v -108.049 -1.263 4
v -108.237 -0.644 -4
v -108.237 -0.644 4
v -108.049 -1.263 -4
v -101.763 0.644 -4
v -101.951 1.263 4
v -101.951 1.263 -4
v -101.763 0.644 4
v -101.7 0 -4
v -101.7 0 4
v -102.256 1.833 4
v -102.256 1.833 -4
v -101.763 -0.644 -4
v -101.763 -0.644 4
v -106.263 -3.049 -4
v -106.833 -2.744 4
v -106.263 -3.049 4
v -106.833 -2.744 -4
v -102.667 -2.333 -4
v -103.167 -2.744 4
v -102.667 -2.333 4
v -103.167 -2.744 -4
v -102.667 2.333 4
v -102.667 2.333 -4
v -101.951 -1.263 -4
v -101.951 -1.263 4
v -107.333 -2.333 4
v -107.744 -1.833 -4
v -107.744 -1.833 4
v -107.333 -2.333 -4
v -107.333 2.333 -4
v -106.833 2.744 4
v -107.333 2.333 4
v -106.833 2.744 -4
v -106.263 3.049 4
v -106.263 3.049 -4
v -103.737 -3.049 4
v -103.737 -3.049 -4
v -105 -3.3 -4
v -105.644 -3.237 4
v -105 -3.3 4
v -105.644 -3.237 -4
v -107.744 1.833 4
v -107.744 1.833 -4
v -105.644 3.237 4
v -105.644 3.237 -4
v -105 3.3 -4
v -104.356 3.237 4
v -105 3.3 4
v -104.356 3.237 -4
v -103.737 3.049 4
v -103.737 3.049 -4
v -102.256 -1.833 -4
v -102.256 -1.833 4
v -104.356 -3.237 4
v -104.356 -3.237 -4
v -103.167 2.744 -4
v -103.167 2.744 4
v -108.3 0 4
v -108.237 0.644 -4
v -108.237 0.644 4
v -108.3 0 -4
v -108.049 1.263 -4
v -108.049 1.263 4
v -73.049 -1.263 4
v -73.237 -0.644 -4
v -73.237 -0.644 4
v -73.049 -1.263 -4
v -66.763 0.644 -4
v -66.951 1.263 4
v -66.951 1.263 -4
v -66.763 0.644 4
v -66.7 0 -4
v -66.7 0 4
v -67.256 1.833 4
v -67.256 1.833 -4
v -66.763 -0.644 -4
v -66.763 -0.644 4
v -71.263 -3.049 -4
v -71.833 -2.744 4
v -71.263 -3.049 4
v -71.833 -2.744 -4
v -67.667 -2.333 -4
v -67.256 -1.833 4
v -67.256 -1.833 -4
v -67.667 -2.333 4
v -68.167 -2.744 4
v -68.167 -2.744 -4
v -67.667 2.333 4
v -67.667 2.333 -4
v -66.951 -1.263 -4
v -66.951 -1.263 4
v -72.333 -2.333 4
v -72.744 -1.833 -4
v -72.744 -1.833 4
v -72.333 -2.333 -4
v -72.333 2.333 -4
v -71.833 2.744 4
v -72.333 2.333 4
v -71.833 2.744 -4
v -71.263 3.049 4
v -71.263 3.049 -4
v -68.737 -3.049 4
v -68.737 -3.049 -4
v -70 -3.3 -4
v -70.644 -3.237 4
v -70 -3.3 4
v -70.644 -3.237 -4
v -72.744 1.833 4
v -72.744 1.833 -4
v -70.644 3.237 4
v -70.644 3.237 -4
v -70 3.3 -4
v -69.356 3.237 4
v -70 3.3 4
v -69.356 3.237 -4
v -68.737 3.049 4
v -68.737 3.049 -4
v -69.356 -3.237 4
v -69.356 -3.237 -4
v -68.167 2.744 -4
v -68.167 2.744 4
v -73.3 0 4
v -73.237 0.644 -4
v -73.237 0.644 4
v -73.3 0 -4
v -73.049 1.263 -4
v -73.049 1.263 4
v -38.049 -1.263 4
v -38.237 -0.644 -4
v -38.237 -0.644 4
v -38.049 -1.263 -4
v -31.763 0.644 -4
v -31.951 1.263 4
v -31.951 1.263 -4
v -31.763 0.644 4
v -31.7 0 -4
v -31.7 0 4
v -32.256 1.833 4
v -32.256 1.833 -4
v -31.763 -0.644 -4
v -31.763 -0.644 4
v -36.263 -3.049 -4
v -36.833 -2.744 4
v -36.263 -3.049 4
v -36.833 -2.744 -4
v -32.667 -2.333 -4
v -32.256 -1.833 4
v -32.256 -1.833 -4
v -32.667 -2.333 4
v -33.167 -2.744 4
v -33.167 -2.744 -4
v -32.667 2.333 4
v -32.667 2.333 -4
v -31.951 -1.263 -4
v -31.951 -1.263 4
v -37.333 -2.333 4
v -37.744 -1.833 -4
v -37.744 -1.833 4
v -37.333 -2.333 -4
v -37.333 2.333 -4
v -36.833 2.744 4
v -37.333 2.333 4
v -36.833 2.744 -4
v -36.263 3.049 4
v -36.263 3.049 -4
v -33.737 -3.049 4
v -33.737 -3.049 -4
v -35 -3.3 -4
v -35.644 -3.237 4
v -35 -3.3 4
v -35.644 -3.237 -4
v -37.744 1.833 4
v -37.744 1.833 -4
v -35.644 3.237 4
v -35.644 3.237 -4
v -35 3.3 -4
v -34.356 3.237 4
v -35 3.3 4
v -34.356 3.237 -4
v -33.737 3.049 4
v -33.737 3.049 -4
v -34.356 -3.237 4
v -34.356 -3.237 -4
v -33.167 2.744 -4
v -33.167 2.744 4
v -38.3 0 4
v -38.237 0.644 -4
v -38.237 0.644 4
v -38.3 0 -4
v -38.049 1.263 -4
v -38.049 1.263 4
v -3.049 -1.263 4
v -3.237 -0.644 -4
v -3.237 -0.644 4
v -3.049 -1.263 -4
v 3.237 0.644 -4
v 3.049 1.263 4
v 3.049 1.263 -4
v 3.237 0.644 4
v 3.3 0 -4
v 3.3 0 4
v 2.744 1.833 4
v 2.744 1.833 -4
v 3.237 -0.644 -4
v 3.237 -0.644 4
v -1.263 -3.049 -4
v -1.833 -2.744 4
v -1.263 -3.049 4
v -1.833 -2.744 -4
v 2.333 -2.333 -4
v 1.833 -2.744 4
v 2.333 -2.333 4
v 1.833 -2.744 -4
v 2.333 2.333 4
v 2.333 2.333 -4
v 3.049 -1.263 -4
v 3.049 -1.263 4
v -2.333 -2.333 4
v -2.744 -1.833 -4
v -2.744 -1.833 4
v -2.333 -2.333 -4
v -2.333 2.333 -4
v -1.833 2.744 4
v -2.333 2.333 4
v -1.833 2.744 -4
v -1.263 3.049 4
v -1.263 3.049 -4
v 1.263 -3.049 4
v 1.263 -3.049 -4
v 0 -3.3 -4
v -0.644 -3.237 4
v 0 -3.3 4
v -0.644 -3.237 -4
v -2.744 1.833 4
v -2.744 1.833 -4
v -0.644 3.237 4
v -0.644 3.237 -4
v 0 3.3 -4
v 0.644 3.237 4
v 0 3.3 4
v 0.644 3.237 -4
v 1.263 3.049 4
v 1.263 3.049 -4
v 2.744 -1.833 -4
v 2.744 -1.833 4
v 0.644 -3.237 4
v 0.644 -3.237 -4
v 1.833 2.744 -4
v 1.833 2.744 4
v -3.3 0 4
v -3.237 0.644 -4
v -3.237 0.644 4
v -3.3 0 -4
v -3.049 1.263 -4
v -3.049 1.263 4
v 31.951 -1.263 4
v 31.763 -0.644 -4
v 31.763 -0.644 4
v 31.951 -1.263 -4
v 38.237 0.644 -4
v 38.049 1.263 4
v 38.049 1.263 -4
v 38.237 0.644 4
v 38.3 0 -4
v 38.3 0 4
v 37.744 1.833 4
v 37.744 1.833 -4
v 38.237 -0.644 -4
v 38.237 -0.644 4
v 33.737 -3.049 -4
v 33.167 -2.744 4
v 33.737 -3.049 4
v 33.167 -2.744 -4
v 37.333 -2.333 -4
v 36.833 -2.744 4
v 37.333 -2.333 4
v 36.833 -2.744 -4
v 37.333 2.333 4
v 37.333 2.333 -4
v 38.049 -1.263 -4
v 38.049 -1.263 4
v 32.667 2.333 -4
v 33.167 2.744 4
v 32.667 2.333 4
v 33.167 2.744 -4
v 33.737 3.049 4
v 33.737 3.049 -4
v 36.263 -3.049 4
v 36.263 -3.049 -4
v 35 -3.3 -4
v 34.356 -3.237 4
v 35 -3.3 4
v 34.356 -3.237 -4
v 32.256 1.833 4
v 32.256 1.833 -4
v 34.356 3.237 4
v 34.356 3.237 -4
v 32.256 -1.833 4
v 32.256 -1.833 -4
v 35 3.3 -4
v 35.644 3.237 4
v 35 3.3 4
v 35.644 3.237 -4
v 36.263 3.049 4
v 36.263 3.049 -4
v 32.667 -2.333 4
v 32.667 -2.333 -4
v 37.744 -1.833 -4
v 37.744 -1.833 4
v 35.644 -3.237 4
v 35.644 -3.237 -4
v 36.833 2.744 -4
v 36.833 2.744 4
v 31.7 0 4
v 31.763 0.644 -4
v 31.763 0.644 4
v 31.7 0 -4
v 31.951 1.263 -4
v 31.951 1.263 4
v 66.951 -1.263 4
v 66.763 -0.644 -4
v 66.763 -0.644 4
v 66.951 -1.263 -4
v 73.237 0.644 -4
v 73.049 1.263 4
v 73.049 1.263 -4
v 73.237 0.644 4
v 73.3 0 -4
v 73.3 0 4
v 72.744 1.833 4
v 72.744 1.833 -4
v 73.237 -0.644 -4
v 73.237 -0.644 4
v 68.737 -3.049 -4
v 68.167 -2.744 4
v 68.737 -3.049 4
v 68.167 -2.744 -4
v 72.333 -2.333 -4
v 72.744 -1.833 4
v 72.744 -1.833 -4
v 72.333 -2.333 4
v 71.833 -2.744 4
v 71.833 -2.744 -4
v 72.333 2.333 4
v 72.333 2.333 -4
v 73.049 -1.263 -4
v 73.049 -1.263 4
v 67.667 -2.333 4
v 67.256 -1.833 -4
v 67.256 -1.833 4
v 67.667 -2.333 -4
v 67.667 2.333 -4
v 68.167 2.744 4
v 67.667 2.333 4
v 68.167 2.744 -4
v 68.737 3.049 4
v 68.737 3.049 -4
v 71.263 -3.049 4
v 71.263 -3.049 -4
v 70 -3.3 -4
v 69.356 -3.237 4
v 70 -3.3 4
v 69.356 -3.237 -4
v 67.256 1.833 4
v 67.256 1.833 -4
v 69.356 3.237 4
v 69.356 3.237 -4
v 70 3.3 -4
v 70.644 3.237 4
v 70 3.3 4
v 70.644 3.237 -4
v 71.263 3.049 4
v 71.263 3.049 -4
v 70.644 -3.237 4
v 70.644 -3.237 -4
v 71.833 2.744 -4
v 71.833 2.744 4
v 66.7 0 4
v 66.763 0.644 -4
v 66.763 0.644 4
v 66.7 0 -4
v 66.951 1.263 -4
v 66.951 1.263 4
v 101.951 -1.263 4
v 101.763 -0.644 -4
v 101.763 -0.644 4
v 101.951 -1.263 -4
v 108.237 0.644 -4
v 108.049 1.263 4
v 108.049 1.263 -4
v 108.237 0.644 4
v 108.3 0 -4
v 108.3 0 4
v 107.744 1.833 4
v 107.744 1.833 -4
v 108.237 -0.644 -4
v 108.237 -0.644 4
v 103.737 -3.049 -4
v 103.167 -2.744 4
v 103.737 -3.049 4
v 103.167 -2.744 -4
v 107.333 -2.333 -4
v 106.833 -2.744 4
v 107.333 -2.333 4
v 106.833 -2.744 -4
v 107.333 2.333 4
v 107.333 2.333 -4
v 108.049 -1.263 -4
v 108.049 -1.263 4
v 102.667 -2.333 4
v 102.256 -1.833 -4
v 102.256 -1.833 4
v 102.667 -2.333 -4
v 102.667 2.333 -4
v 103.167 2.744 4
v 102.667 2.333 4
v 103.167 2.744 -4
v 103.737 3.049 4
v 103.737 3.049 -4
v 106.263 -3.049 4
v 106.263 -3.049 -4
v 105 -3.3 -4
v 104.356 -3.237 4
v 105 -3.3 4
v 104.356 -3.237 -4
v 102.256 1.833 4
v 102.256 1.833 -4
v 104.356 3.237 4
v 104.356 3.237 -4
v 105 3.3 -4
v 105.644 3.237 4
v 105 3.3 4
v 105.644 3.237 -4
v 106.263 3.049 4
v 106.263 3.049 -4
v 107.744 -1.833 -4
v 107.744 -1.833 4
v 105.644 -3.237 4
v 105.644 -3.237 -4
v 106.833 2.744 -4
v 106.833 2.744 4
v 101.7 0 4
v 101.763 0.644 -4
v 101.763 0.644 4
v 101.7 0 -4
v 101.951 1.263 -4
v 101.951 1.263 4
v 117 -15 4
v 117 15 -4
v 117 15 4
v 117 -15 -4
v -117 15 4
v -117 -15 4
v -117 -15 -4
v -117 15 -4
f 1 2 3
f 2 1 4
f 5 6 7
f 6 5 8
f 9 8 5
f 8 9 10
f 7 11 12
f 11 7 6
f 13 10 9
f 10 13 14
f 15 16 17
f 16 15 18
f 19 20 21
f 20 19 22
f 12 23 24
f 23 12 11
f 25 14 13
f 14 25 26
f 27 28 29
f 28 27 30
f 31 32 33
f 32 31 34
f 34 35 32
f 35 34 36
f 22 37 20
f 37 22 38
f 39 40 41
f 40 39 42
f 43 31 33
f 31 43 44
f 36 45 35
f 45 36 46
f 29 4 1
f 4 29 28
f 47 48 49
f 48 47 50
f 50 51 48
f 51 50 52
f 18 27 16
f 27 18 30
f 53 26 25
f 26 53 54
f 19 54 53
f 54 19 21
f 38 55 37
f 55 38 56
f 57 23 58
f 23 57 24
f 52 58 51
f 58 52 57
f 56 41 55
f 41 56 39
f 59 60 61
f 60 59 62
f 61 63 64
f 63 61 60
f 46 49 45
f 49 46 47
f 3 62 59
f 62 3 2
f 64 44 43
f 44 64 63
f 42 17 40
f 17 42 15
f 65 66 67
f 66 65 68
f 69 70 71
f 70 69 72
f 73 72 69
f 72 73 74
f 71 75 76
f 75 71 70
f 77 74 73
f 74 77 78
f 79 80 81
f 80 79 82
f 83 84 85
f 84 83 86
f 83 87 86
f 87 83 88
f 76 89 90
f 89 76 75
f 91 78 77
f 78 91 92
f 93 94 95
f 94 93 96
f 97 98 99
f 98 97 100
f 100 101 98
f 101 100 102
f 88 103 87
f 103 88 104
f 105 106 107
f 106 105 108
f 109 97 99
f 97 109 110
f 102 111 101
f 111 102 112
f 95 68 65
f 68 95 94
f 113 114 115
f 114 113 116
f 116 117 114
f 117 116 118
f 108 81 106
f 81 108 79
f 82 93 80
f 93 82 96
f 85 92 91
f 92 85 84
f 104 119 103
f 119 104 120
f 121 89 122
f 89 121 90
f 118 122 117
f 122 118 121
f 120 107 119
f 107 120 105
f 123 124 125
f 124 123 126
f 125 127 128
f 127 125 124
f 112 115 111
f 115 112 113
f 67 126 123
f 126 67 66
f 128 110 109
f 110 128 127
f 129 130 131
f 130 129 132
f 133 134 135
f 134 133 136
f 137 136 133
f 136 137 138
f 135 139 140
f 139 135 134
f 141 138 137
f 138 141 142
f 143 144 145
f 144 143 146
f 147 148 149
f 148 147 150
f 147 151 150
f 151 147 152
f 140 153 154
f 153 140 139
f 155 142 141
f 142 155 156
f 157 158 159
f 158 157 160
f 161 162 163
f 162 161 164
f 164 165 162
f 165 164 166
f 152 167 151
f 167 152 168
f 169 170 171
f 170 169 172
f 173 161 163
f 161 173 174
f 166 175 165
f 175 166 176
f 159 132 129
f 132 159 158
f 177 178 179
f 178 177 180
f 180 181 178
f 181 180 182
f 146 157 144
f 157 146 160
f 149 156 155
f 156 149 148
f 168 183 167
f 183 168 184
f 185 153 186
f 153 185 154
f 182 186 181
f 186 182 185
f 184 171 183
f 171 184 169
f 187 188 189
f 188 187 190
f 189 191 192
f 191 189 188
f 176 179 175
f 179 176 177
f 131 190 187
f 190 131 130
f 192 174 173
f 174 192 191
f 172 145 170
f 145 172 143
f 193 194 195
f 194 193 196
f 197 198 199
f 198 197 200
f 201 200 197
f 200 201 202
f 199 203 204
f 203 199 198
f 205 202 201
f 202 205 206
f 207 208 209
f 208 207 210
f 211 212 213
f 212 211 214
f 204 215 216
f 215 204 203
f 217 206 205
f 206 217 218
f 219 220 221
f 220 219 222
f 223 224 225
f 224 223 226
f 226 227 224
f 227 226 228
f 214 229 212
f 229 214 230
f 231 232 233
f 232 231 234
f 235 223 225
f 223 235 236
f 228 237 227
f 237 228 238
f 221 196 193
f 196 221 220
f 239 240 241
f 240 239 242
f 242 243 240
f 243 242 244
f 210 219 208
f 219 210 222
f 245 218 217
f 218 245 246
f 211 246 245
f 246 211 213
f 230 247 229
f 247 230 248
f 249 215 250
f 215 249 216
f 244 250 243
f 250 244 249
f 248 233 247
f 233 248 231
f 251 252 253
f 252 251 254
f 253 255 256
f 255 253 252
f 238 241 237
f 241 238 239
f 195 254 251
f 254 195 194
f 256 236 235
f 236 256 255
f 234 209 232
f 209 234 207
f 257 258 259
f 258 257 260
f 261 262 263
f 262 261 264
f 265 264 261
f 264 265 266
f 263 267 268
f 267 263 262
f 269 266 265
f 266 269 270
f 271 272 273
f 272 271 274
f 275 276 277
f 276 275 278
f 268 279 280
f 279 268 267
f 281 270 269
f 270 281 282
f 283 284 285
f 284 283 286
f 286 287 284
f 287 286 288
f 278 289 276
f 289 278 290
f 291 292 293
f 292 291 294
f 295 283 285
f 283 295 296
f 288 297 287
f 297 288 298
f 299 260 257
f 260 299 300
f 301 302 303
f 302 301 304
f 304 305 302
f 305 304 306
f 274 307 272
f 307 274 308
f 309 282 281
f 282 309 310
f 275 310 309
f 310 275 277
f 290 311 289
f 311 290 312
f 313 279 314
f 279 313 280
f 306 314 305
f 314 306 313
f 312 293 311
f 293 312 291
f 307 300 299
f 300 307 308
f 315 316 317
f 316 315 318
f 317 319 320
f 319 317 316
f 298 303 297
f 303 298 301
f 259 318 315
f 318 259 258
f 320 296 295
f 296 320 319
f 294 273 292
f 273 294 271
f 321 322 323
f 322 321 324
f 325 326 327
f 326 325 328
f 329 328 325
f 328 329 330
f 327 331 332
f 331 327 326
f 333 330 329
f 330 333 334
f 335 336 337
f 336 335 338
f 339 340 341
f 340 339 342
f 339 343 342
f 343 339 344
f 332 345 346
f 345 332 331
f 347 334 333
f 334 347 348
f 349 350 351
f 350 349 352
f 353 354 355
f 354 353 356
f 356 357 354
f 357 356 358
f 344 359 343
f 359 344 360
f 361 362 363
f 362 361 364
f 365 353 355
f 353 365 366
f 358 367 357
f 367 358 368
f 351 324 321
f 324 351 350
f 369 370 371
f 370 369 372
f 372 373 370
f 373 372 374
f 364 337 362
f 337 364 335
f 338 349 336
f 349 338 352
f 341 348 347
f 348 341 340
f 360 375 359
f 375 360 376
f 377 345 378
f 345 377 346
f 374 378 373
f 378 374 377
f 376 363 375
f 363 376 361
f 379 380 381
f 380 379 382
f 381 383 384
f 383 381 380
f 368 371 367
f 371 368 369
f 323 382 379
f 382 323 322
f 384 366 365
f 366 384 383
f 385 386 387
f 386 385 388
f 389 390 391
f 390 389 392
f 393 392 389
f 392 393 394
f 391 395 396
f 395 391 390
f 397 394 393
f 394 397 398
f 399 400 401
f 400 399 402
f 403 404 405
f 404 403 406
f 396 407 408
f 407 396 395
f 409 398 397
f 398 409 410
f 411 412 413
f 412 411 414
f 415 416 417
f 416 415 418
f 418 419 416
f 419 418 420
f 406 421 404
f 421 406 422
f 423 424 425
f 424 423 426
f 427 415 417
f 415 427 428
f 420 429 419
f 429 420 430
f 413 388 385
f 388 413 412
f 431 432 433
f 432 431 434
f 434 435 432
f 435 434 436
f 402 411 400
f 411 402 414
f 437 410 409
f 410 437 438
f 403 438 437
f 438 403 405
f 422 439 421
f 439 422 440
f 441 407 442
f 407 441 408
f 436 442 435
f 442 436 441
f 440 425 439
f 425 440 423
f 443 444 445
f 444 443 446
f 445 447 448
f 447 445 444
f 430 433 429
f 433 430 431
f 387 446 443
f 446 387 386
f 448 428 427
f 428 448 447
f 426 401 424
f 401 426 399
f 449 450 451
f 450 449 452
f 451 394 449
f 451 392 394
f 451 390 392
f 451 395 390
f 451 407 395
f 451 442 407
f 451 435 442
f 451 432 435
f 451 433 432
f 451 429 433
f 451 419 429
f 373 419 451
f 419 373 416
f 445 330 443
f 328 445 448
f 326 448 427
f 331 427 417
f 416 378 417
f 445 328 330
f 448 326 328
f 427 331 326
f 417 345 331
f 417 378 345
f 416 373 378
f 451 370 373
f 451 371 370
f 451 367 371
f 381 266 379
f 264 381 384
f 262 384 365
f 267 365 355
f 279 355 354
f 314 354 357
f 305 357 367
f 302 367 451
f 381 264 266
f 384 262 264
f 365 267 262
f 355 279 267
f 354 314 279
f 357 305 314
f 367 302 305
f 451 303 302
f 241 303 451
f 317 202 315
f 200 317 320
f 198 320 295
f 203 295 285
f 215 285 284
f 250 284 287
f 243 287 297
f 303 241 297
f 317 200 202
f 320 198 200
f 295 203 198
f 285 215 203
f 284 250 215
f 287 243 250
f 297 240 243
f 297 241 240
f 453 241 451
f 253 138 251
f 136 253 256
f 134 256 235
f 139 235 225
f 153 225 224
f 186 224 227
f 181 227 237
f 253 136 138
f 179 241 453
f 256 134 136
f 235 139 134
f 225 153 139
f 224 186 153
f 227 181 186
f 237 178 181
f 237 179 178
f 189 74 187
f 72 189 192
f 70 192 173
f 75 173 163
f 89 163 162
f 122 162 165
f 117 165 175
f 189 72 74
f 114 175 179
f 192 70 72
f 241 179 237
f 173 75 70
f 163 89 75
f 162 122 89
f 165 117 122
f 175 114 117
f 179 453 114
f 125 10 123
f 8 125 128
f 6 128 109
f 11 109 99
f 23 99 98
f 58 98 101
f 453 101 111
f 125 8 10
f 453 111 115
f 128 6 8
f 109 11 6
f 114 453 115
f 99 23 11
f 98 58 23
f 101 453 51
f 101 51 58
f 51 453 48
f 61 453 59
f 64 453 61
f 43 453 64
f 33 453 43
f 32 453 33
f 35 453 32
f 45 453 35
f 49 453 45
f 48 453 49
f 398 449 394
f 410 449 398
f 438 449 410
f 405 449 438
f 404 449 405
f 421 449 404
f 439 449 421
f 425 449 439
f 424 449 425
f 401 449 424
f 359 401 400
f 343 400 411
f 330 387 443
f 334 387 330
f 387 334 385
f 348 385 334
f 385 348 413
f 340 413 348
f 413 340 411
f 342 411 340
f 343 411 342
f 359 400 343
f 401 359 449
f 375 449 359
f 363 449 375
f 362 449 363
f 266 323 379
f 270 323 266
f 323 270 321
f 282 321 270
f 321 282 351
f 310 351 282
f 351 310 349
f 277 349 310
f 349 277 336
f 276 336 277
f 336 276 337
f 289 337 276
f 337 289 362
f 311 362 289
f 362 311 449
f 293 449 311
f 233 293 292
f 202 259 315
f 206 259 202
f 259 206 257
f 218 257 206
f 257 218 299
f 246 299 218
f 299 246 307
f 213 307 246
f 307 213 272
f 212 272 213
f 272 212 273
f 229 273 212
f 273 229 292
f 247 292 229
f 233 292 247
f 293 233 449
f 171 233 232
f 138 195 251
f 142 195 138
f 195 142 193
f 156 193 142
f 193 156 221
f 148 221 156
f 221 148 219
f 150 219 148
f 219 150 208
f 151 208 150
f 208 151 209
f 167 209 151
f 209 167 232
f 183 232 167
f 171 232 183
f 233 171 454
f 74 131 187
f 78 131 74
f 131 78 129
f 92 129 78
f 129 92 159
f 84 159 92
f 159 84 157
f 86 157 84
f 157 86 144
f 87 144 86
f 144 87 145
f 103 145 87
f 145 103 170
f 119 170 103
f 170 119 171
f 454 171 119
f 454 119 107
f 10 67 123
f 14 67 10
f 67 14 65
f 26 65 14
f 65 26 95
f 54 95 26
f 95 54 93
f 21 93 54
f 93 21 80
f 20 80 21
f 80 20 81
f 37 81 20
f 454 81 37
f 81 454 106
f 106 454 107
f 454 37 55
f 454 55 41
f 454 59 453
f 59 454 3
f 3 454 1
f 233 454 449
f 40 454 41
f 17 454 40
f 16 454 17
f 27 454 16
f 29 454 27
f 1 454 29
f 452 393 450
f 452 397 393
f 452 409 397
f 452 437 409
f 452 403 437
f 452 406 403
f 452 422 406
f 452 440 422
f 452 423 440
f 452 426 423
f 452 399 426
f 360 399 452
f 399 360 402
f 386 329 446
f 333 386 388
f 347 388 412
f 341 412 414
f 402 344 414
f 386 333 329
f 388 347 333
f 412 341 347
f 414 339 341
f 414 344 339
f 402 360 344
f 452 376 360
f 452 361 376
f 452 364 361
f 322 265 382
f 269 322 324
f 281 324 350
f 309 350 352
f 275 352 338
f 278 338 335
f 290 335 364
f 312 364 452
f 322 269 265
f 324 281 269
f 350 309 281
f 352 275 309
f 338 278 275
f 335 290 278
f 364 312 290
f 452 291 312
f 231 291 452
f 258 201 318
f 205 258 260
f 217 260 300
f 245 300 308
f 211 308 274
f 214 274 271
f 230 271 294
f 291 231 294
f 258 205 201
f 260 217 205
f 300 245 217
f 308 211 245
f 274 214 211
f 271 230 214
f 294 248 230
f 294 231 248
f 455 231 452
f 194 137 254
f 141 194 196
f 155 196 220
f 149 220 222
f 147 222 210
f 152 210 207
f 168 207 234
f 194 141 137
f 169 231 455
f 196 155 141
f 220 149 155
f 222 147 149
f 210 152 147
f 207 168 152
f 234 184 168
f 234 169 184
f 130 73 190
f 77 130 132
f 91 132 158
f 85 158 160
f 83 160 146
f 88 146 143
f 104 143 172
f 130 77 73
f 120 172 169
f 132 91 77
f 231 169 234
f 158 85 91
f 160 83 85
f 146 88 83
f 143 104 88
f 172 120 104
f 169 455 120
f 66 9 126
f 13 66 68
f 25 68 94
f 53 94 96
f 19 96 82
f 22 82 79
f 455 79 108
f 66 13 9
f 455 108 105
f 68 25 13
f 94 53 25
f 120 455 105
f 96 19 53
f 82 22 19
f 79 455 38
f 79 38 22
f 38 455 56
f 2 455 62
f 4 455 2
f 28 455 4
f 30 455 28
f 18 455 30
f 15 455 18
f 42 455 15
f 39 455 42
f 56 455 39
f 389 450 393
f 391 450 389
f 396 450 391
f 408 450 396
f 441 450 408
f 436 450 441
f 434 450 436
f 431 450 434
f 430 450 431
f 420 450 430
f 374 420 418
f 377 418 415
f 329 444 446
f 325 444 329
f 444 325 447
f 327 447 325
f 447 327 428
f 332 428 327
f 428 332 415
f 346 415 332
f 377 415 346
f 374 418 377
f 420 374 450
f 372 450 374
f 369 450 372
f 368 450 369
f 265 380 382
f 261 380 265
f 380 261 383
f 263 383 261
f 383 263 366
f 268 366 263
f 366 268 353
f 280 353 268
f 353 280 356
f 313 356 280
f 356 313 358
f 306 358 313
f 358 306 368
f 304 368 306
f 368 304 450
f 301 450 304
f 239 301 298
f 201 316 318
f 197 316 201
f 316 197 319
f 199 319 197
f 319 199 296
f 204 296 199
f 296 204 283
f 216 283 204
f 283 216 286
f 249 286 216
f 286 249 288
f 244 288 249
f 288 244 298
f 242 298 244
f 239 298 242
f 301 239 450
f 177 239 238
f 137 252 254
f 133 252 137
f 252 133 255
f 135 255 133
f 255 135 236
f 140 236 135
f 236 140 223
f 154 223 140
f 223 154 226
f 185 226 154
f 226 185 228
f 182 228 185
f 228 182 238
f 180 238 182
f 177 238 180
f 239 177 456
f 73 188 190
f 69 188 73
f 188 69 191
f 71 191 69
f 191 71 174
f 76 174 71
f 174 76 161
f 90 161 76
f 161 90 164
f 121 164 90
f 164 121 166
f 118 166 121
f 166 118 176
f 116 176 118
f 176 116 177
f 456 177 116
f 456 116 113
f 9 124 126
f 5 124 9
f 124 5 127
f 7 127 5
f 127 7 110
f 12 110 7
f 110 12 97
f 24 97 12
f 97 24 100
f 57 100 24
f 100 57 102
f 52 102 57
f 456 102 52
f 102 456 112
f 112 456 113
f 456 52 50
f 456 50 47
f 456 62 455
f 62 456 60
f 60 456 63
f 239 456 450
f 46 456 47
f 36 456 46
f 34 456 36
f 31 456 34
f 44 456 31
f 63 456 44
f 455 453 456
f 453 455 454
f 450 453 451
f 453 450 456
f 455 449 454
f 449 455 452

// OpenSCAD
$fn = 32;

// ----------------------------------------------------------------------
// Hole bar, 7 x Ø6.6
// row layout, 12 mm edge offset
// ----------------------------------------------------------------------

// --- parameters (mm) ---
bar_w = 30;    // bar width (Y)
bar_t = 8;     // bar thickness (Z)
holes = 7;     // holes per row
hole_d = 6.6;  // hole diameter
edge = 12;     // offset from the bar end to the first hole
pitch = 35;    // pitch between neighbouring holes

// --- derived feature positions (mm) ---
span = (holes - 1) * pitch;   // = 210   distance between the end holes
bar_l = span + 2 * edge;      // = 234   overall bar length
start_x = -bar_l / 2 + edge;  // = -105   X of the first hole
feature_centers = [
  [start_x + 0 * pitch, 0],
  [start_x + 1 * pitch, 0],
  [start_x + 2 * pitch, 0],
  [start_x + 3 * pitch, 0],
  [start_x + 4 * pitch, 0],
  [start_x + 5 * pitch, 0],
  [start_x + 6 * pitch, 0]
];   // hole centres of the first row

// bar with one row of holes, drilled from feature_centers
difference() {
  translate([-bar_l / 2, -bar_w / 2, -bar_t / 2]) cube([bar_l, bar_w, bar_t]);
  for (centre = feature_centers)
    translate([centre[0], centre[1], 0])
      cylinder(d = hole_d, h = bar_t + 2, center = true);
}
